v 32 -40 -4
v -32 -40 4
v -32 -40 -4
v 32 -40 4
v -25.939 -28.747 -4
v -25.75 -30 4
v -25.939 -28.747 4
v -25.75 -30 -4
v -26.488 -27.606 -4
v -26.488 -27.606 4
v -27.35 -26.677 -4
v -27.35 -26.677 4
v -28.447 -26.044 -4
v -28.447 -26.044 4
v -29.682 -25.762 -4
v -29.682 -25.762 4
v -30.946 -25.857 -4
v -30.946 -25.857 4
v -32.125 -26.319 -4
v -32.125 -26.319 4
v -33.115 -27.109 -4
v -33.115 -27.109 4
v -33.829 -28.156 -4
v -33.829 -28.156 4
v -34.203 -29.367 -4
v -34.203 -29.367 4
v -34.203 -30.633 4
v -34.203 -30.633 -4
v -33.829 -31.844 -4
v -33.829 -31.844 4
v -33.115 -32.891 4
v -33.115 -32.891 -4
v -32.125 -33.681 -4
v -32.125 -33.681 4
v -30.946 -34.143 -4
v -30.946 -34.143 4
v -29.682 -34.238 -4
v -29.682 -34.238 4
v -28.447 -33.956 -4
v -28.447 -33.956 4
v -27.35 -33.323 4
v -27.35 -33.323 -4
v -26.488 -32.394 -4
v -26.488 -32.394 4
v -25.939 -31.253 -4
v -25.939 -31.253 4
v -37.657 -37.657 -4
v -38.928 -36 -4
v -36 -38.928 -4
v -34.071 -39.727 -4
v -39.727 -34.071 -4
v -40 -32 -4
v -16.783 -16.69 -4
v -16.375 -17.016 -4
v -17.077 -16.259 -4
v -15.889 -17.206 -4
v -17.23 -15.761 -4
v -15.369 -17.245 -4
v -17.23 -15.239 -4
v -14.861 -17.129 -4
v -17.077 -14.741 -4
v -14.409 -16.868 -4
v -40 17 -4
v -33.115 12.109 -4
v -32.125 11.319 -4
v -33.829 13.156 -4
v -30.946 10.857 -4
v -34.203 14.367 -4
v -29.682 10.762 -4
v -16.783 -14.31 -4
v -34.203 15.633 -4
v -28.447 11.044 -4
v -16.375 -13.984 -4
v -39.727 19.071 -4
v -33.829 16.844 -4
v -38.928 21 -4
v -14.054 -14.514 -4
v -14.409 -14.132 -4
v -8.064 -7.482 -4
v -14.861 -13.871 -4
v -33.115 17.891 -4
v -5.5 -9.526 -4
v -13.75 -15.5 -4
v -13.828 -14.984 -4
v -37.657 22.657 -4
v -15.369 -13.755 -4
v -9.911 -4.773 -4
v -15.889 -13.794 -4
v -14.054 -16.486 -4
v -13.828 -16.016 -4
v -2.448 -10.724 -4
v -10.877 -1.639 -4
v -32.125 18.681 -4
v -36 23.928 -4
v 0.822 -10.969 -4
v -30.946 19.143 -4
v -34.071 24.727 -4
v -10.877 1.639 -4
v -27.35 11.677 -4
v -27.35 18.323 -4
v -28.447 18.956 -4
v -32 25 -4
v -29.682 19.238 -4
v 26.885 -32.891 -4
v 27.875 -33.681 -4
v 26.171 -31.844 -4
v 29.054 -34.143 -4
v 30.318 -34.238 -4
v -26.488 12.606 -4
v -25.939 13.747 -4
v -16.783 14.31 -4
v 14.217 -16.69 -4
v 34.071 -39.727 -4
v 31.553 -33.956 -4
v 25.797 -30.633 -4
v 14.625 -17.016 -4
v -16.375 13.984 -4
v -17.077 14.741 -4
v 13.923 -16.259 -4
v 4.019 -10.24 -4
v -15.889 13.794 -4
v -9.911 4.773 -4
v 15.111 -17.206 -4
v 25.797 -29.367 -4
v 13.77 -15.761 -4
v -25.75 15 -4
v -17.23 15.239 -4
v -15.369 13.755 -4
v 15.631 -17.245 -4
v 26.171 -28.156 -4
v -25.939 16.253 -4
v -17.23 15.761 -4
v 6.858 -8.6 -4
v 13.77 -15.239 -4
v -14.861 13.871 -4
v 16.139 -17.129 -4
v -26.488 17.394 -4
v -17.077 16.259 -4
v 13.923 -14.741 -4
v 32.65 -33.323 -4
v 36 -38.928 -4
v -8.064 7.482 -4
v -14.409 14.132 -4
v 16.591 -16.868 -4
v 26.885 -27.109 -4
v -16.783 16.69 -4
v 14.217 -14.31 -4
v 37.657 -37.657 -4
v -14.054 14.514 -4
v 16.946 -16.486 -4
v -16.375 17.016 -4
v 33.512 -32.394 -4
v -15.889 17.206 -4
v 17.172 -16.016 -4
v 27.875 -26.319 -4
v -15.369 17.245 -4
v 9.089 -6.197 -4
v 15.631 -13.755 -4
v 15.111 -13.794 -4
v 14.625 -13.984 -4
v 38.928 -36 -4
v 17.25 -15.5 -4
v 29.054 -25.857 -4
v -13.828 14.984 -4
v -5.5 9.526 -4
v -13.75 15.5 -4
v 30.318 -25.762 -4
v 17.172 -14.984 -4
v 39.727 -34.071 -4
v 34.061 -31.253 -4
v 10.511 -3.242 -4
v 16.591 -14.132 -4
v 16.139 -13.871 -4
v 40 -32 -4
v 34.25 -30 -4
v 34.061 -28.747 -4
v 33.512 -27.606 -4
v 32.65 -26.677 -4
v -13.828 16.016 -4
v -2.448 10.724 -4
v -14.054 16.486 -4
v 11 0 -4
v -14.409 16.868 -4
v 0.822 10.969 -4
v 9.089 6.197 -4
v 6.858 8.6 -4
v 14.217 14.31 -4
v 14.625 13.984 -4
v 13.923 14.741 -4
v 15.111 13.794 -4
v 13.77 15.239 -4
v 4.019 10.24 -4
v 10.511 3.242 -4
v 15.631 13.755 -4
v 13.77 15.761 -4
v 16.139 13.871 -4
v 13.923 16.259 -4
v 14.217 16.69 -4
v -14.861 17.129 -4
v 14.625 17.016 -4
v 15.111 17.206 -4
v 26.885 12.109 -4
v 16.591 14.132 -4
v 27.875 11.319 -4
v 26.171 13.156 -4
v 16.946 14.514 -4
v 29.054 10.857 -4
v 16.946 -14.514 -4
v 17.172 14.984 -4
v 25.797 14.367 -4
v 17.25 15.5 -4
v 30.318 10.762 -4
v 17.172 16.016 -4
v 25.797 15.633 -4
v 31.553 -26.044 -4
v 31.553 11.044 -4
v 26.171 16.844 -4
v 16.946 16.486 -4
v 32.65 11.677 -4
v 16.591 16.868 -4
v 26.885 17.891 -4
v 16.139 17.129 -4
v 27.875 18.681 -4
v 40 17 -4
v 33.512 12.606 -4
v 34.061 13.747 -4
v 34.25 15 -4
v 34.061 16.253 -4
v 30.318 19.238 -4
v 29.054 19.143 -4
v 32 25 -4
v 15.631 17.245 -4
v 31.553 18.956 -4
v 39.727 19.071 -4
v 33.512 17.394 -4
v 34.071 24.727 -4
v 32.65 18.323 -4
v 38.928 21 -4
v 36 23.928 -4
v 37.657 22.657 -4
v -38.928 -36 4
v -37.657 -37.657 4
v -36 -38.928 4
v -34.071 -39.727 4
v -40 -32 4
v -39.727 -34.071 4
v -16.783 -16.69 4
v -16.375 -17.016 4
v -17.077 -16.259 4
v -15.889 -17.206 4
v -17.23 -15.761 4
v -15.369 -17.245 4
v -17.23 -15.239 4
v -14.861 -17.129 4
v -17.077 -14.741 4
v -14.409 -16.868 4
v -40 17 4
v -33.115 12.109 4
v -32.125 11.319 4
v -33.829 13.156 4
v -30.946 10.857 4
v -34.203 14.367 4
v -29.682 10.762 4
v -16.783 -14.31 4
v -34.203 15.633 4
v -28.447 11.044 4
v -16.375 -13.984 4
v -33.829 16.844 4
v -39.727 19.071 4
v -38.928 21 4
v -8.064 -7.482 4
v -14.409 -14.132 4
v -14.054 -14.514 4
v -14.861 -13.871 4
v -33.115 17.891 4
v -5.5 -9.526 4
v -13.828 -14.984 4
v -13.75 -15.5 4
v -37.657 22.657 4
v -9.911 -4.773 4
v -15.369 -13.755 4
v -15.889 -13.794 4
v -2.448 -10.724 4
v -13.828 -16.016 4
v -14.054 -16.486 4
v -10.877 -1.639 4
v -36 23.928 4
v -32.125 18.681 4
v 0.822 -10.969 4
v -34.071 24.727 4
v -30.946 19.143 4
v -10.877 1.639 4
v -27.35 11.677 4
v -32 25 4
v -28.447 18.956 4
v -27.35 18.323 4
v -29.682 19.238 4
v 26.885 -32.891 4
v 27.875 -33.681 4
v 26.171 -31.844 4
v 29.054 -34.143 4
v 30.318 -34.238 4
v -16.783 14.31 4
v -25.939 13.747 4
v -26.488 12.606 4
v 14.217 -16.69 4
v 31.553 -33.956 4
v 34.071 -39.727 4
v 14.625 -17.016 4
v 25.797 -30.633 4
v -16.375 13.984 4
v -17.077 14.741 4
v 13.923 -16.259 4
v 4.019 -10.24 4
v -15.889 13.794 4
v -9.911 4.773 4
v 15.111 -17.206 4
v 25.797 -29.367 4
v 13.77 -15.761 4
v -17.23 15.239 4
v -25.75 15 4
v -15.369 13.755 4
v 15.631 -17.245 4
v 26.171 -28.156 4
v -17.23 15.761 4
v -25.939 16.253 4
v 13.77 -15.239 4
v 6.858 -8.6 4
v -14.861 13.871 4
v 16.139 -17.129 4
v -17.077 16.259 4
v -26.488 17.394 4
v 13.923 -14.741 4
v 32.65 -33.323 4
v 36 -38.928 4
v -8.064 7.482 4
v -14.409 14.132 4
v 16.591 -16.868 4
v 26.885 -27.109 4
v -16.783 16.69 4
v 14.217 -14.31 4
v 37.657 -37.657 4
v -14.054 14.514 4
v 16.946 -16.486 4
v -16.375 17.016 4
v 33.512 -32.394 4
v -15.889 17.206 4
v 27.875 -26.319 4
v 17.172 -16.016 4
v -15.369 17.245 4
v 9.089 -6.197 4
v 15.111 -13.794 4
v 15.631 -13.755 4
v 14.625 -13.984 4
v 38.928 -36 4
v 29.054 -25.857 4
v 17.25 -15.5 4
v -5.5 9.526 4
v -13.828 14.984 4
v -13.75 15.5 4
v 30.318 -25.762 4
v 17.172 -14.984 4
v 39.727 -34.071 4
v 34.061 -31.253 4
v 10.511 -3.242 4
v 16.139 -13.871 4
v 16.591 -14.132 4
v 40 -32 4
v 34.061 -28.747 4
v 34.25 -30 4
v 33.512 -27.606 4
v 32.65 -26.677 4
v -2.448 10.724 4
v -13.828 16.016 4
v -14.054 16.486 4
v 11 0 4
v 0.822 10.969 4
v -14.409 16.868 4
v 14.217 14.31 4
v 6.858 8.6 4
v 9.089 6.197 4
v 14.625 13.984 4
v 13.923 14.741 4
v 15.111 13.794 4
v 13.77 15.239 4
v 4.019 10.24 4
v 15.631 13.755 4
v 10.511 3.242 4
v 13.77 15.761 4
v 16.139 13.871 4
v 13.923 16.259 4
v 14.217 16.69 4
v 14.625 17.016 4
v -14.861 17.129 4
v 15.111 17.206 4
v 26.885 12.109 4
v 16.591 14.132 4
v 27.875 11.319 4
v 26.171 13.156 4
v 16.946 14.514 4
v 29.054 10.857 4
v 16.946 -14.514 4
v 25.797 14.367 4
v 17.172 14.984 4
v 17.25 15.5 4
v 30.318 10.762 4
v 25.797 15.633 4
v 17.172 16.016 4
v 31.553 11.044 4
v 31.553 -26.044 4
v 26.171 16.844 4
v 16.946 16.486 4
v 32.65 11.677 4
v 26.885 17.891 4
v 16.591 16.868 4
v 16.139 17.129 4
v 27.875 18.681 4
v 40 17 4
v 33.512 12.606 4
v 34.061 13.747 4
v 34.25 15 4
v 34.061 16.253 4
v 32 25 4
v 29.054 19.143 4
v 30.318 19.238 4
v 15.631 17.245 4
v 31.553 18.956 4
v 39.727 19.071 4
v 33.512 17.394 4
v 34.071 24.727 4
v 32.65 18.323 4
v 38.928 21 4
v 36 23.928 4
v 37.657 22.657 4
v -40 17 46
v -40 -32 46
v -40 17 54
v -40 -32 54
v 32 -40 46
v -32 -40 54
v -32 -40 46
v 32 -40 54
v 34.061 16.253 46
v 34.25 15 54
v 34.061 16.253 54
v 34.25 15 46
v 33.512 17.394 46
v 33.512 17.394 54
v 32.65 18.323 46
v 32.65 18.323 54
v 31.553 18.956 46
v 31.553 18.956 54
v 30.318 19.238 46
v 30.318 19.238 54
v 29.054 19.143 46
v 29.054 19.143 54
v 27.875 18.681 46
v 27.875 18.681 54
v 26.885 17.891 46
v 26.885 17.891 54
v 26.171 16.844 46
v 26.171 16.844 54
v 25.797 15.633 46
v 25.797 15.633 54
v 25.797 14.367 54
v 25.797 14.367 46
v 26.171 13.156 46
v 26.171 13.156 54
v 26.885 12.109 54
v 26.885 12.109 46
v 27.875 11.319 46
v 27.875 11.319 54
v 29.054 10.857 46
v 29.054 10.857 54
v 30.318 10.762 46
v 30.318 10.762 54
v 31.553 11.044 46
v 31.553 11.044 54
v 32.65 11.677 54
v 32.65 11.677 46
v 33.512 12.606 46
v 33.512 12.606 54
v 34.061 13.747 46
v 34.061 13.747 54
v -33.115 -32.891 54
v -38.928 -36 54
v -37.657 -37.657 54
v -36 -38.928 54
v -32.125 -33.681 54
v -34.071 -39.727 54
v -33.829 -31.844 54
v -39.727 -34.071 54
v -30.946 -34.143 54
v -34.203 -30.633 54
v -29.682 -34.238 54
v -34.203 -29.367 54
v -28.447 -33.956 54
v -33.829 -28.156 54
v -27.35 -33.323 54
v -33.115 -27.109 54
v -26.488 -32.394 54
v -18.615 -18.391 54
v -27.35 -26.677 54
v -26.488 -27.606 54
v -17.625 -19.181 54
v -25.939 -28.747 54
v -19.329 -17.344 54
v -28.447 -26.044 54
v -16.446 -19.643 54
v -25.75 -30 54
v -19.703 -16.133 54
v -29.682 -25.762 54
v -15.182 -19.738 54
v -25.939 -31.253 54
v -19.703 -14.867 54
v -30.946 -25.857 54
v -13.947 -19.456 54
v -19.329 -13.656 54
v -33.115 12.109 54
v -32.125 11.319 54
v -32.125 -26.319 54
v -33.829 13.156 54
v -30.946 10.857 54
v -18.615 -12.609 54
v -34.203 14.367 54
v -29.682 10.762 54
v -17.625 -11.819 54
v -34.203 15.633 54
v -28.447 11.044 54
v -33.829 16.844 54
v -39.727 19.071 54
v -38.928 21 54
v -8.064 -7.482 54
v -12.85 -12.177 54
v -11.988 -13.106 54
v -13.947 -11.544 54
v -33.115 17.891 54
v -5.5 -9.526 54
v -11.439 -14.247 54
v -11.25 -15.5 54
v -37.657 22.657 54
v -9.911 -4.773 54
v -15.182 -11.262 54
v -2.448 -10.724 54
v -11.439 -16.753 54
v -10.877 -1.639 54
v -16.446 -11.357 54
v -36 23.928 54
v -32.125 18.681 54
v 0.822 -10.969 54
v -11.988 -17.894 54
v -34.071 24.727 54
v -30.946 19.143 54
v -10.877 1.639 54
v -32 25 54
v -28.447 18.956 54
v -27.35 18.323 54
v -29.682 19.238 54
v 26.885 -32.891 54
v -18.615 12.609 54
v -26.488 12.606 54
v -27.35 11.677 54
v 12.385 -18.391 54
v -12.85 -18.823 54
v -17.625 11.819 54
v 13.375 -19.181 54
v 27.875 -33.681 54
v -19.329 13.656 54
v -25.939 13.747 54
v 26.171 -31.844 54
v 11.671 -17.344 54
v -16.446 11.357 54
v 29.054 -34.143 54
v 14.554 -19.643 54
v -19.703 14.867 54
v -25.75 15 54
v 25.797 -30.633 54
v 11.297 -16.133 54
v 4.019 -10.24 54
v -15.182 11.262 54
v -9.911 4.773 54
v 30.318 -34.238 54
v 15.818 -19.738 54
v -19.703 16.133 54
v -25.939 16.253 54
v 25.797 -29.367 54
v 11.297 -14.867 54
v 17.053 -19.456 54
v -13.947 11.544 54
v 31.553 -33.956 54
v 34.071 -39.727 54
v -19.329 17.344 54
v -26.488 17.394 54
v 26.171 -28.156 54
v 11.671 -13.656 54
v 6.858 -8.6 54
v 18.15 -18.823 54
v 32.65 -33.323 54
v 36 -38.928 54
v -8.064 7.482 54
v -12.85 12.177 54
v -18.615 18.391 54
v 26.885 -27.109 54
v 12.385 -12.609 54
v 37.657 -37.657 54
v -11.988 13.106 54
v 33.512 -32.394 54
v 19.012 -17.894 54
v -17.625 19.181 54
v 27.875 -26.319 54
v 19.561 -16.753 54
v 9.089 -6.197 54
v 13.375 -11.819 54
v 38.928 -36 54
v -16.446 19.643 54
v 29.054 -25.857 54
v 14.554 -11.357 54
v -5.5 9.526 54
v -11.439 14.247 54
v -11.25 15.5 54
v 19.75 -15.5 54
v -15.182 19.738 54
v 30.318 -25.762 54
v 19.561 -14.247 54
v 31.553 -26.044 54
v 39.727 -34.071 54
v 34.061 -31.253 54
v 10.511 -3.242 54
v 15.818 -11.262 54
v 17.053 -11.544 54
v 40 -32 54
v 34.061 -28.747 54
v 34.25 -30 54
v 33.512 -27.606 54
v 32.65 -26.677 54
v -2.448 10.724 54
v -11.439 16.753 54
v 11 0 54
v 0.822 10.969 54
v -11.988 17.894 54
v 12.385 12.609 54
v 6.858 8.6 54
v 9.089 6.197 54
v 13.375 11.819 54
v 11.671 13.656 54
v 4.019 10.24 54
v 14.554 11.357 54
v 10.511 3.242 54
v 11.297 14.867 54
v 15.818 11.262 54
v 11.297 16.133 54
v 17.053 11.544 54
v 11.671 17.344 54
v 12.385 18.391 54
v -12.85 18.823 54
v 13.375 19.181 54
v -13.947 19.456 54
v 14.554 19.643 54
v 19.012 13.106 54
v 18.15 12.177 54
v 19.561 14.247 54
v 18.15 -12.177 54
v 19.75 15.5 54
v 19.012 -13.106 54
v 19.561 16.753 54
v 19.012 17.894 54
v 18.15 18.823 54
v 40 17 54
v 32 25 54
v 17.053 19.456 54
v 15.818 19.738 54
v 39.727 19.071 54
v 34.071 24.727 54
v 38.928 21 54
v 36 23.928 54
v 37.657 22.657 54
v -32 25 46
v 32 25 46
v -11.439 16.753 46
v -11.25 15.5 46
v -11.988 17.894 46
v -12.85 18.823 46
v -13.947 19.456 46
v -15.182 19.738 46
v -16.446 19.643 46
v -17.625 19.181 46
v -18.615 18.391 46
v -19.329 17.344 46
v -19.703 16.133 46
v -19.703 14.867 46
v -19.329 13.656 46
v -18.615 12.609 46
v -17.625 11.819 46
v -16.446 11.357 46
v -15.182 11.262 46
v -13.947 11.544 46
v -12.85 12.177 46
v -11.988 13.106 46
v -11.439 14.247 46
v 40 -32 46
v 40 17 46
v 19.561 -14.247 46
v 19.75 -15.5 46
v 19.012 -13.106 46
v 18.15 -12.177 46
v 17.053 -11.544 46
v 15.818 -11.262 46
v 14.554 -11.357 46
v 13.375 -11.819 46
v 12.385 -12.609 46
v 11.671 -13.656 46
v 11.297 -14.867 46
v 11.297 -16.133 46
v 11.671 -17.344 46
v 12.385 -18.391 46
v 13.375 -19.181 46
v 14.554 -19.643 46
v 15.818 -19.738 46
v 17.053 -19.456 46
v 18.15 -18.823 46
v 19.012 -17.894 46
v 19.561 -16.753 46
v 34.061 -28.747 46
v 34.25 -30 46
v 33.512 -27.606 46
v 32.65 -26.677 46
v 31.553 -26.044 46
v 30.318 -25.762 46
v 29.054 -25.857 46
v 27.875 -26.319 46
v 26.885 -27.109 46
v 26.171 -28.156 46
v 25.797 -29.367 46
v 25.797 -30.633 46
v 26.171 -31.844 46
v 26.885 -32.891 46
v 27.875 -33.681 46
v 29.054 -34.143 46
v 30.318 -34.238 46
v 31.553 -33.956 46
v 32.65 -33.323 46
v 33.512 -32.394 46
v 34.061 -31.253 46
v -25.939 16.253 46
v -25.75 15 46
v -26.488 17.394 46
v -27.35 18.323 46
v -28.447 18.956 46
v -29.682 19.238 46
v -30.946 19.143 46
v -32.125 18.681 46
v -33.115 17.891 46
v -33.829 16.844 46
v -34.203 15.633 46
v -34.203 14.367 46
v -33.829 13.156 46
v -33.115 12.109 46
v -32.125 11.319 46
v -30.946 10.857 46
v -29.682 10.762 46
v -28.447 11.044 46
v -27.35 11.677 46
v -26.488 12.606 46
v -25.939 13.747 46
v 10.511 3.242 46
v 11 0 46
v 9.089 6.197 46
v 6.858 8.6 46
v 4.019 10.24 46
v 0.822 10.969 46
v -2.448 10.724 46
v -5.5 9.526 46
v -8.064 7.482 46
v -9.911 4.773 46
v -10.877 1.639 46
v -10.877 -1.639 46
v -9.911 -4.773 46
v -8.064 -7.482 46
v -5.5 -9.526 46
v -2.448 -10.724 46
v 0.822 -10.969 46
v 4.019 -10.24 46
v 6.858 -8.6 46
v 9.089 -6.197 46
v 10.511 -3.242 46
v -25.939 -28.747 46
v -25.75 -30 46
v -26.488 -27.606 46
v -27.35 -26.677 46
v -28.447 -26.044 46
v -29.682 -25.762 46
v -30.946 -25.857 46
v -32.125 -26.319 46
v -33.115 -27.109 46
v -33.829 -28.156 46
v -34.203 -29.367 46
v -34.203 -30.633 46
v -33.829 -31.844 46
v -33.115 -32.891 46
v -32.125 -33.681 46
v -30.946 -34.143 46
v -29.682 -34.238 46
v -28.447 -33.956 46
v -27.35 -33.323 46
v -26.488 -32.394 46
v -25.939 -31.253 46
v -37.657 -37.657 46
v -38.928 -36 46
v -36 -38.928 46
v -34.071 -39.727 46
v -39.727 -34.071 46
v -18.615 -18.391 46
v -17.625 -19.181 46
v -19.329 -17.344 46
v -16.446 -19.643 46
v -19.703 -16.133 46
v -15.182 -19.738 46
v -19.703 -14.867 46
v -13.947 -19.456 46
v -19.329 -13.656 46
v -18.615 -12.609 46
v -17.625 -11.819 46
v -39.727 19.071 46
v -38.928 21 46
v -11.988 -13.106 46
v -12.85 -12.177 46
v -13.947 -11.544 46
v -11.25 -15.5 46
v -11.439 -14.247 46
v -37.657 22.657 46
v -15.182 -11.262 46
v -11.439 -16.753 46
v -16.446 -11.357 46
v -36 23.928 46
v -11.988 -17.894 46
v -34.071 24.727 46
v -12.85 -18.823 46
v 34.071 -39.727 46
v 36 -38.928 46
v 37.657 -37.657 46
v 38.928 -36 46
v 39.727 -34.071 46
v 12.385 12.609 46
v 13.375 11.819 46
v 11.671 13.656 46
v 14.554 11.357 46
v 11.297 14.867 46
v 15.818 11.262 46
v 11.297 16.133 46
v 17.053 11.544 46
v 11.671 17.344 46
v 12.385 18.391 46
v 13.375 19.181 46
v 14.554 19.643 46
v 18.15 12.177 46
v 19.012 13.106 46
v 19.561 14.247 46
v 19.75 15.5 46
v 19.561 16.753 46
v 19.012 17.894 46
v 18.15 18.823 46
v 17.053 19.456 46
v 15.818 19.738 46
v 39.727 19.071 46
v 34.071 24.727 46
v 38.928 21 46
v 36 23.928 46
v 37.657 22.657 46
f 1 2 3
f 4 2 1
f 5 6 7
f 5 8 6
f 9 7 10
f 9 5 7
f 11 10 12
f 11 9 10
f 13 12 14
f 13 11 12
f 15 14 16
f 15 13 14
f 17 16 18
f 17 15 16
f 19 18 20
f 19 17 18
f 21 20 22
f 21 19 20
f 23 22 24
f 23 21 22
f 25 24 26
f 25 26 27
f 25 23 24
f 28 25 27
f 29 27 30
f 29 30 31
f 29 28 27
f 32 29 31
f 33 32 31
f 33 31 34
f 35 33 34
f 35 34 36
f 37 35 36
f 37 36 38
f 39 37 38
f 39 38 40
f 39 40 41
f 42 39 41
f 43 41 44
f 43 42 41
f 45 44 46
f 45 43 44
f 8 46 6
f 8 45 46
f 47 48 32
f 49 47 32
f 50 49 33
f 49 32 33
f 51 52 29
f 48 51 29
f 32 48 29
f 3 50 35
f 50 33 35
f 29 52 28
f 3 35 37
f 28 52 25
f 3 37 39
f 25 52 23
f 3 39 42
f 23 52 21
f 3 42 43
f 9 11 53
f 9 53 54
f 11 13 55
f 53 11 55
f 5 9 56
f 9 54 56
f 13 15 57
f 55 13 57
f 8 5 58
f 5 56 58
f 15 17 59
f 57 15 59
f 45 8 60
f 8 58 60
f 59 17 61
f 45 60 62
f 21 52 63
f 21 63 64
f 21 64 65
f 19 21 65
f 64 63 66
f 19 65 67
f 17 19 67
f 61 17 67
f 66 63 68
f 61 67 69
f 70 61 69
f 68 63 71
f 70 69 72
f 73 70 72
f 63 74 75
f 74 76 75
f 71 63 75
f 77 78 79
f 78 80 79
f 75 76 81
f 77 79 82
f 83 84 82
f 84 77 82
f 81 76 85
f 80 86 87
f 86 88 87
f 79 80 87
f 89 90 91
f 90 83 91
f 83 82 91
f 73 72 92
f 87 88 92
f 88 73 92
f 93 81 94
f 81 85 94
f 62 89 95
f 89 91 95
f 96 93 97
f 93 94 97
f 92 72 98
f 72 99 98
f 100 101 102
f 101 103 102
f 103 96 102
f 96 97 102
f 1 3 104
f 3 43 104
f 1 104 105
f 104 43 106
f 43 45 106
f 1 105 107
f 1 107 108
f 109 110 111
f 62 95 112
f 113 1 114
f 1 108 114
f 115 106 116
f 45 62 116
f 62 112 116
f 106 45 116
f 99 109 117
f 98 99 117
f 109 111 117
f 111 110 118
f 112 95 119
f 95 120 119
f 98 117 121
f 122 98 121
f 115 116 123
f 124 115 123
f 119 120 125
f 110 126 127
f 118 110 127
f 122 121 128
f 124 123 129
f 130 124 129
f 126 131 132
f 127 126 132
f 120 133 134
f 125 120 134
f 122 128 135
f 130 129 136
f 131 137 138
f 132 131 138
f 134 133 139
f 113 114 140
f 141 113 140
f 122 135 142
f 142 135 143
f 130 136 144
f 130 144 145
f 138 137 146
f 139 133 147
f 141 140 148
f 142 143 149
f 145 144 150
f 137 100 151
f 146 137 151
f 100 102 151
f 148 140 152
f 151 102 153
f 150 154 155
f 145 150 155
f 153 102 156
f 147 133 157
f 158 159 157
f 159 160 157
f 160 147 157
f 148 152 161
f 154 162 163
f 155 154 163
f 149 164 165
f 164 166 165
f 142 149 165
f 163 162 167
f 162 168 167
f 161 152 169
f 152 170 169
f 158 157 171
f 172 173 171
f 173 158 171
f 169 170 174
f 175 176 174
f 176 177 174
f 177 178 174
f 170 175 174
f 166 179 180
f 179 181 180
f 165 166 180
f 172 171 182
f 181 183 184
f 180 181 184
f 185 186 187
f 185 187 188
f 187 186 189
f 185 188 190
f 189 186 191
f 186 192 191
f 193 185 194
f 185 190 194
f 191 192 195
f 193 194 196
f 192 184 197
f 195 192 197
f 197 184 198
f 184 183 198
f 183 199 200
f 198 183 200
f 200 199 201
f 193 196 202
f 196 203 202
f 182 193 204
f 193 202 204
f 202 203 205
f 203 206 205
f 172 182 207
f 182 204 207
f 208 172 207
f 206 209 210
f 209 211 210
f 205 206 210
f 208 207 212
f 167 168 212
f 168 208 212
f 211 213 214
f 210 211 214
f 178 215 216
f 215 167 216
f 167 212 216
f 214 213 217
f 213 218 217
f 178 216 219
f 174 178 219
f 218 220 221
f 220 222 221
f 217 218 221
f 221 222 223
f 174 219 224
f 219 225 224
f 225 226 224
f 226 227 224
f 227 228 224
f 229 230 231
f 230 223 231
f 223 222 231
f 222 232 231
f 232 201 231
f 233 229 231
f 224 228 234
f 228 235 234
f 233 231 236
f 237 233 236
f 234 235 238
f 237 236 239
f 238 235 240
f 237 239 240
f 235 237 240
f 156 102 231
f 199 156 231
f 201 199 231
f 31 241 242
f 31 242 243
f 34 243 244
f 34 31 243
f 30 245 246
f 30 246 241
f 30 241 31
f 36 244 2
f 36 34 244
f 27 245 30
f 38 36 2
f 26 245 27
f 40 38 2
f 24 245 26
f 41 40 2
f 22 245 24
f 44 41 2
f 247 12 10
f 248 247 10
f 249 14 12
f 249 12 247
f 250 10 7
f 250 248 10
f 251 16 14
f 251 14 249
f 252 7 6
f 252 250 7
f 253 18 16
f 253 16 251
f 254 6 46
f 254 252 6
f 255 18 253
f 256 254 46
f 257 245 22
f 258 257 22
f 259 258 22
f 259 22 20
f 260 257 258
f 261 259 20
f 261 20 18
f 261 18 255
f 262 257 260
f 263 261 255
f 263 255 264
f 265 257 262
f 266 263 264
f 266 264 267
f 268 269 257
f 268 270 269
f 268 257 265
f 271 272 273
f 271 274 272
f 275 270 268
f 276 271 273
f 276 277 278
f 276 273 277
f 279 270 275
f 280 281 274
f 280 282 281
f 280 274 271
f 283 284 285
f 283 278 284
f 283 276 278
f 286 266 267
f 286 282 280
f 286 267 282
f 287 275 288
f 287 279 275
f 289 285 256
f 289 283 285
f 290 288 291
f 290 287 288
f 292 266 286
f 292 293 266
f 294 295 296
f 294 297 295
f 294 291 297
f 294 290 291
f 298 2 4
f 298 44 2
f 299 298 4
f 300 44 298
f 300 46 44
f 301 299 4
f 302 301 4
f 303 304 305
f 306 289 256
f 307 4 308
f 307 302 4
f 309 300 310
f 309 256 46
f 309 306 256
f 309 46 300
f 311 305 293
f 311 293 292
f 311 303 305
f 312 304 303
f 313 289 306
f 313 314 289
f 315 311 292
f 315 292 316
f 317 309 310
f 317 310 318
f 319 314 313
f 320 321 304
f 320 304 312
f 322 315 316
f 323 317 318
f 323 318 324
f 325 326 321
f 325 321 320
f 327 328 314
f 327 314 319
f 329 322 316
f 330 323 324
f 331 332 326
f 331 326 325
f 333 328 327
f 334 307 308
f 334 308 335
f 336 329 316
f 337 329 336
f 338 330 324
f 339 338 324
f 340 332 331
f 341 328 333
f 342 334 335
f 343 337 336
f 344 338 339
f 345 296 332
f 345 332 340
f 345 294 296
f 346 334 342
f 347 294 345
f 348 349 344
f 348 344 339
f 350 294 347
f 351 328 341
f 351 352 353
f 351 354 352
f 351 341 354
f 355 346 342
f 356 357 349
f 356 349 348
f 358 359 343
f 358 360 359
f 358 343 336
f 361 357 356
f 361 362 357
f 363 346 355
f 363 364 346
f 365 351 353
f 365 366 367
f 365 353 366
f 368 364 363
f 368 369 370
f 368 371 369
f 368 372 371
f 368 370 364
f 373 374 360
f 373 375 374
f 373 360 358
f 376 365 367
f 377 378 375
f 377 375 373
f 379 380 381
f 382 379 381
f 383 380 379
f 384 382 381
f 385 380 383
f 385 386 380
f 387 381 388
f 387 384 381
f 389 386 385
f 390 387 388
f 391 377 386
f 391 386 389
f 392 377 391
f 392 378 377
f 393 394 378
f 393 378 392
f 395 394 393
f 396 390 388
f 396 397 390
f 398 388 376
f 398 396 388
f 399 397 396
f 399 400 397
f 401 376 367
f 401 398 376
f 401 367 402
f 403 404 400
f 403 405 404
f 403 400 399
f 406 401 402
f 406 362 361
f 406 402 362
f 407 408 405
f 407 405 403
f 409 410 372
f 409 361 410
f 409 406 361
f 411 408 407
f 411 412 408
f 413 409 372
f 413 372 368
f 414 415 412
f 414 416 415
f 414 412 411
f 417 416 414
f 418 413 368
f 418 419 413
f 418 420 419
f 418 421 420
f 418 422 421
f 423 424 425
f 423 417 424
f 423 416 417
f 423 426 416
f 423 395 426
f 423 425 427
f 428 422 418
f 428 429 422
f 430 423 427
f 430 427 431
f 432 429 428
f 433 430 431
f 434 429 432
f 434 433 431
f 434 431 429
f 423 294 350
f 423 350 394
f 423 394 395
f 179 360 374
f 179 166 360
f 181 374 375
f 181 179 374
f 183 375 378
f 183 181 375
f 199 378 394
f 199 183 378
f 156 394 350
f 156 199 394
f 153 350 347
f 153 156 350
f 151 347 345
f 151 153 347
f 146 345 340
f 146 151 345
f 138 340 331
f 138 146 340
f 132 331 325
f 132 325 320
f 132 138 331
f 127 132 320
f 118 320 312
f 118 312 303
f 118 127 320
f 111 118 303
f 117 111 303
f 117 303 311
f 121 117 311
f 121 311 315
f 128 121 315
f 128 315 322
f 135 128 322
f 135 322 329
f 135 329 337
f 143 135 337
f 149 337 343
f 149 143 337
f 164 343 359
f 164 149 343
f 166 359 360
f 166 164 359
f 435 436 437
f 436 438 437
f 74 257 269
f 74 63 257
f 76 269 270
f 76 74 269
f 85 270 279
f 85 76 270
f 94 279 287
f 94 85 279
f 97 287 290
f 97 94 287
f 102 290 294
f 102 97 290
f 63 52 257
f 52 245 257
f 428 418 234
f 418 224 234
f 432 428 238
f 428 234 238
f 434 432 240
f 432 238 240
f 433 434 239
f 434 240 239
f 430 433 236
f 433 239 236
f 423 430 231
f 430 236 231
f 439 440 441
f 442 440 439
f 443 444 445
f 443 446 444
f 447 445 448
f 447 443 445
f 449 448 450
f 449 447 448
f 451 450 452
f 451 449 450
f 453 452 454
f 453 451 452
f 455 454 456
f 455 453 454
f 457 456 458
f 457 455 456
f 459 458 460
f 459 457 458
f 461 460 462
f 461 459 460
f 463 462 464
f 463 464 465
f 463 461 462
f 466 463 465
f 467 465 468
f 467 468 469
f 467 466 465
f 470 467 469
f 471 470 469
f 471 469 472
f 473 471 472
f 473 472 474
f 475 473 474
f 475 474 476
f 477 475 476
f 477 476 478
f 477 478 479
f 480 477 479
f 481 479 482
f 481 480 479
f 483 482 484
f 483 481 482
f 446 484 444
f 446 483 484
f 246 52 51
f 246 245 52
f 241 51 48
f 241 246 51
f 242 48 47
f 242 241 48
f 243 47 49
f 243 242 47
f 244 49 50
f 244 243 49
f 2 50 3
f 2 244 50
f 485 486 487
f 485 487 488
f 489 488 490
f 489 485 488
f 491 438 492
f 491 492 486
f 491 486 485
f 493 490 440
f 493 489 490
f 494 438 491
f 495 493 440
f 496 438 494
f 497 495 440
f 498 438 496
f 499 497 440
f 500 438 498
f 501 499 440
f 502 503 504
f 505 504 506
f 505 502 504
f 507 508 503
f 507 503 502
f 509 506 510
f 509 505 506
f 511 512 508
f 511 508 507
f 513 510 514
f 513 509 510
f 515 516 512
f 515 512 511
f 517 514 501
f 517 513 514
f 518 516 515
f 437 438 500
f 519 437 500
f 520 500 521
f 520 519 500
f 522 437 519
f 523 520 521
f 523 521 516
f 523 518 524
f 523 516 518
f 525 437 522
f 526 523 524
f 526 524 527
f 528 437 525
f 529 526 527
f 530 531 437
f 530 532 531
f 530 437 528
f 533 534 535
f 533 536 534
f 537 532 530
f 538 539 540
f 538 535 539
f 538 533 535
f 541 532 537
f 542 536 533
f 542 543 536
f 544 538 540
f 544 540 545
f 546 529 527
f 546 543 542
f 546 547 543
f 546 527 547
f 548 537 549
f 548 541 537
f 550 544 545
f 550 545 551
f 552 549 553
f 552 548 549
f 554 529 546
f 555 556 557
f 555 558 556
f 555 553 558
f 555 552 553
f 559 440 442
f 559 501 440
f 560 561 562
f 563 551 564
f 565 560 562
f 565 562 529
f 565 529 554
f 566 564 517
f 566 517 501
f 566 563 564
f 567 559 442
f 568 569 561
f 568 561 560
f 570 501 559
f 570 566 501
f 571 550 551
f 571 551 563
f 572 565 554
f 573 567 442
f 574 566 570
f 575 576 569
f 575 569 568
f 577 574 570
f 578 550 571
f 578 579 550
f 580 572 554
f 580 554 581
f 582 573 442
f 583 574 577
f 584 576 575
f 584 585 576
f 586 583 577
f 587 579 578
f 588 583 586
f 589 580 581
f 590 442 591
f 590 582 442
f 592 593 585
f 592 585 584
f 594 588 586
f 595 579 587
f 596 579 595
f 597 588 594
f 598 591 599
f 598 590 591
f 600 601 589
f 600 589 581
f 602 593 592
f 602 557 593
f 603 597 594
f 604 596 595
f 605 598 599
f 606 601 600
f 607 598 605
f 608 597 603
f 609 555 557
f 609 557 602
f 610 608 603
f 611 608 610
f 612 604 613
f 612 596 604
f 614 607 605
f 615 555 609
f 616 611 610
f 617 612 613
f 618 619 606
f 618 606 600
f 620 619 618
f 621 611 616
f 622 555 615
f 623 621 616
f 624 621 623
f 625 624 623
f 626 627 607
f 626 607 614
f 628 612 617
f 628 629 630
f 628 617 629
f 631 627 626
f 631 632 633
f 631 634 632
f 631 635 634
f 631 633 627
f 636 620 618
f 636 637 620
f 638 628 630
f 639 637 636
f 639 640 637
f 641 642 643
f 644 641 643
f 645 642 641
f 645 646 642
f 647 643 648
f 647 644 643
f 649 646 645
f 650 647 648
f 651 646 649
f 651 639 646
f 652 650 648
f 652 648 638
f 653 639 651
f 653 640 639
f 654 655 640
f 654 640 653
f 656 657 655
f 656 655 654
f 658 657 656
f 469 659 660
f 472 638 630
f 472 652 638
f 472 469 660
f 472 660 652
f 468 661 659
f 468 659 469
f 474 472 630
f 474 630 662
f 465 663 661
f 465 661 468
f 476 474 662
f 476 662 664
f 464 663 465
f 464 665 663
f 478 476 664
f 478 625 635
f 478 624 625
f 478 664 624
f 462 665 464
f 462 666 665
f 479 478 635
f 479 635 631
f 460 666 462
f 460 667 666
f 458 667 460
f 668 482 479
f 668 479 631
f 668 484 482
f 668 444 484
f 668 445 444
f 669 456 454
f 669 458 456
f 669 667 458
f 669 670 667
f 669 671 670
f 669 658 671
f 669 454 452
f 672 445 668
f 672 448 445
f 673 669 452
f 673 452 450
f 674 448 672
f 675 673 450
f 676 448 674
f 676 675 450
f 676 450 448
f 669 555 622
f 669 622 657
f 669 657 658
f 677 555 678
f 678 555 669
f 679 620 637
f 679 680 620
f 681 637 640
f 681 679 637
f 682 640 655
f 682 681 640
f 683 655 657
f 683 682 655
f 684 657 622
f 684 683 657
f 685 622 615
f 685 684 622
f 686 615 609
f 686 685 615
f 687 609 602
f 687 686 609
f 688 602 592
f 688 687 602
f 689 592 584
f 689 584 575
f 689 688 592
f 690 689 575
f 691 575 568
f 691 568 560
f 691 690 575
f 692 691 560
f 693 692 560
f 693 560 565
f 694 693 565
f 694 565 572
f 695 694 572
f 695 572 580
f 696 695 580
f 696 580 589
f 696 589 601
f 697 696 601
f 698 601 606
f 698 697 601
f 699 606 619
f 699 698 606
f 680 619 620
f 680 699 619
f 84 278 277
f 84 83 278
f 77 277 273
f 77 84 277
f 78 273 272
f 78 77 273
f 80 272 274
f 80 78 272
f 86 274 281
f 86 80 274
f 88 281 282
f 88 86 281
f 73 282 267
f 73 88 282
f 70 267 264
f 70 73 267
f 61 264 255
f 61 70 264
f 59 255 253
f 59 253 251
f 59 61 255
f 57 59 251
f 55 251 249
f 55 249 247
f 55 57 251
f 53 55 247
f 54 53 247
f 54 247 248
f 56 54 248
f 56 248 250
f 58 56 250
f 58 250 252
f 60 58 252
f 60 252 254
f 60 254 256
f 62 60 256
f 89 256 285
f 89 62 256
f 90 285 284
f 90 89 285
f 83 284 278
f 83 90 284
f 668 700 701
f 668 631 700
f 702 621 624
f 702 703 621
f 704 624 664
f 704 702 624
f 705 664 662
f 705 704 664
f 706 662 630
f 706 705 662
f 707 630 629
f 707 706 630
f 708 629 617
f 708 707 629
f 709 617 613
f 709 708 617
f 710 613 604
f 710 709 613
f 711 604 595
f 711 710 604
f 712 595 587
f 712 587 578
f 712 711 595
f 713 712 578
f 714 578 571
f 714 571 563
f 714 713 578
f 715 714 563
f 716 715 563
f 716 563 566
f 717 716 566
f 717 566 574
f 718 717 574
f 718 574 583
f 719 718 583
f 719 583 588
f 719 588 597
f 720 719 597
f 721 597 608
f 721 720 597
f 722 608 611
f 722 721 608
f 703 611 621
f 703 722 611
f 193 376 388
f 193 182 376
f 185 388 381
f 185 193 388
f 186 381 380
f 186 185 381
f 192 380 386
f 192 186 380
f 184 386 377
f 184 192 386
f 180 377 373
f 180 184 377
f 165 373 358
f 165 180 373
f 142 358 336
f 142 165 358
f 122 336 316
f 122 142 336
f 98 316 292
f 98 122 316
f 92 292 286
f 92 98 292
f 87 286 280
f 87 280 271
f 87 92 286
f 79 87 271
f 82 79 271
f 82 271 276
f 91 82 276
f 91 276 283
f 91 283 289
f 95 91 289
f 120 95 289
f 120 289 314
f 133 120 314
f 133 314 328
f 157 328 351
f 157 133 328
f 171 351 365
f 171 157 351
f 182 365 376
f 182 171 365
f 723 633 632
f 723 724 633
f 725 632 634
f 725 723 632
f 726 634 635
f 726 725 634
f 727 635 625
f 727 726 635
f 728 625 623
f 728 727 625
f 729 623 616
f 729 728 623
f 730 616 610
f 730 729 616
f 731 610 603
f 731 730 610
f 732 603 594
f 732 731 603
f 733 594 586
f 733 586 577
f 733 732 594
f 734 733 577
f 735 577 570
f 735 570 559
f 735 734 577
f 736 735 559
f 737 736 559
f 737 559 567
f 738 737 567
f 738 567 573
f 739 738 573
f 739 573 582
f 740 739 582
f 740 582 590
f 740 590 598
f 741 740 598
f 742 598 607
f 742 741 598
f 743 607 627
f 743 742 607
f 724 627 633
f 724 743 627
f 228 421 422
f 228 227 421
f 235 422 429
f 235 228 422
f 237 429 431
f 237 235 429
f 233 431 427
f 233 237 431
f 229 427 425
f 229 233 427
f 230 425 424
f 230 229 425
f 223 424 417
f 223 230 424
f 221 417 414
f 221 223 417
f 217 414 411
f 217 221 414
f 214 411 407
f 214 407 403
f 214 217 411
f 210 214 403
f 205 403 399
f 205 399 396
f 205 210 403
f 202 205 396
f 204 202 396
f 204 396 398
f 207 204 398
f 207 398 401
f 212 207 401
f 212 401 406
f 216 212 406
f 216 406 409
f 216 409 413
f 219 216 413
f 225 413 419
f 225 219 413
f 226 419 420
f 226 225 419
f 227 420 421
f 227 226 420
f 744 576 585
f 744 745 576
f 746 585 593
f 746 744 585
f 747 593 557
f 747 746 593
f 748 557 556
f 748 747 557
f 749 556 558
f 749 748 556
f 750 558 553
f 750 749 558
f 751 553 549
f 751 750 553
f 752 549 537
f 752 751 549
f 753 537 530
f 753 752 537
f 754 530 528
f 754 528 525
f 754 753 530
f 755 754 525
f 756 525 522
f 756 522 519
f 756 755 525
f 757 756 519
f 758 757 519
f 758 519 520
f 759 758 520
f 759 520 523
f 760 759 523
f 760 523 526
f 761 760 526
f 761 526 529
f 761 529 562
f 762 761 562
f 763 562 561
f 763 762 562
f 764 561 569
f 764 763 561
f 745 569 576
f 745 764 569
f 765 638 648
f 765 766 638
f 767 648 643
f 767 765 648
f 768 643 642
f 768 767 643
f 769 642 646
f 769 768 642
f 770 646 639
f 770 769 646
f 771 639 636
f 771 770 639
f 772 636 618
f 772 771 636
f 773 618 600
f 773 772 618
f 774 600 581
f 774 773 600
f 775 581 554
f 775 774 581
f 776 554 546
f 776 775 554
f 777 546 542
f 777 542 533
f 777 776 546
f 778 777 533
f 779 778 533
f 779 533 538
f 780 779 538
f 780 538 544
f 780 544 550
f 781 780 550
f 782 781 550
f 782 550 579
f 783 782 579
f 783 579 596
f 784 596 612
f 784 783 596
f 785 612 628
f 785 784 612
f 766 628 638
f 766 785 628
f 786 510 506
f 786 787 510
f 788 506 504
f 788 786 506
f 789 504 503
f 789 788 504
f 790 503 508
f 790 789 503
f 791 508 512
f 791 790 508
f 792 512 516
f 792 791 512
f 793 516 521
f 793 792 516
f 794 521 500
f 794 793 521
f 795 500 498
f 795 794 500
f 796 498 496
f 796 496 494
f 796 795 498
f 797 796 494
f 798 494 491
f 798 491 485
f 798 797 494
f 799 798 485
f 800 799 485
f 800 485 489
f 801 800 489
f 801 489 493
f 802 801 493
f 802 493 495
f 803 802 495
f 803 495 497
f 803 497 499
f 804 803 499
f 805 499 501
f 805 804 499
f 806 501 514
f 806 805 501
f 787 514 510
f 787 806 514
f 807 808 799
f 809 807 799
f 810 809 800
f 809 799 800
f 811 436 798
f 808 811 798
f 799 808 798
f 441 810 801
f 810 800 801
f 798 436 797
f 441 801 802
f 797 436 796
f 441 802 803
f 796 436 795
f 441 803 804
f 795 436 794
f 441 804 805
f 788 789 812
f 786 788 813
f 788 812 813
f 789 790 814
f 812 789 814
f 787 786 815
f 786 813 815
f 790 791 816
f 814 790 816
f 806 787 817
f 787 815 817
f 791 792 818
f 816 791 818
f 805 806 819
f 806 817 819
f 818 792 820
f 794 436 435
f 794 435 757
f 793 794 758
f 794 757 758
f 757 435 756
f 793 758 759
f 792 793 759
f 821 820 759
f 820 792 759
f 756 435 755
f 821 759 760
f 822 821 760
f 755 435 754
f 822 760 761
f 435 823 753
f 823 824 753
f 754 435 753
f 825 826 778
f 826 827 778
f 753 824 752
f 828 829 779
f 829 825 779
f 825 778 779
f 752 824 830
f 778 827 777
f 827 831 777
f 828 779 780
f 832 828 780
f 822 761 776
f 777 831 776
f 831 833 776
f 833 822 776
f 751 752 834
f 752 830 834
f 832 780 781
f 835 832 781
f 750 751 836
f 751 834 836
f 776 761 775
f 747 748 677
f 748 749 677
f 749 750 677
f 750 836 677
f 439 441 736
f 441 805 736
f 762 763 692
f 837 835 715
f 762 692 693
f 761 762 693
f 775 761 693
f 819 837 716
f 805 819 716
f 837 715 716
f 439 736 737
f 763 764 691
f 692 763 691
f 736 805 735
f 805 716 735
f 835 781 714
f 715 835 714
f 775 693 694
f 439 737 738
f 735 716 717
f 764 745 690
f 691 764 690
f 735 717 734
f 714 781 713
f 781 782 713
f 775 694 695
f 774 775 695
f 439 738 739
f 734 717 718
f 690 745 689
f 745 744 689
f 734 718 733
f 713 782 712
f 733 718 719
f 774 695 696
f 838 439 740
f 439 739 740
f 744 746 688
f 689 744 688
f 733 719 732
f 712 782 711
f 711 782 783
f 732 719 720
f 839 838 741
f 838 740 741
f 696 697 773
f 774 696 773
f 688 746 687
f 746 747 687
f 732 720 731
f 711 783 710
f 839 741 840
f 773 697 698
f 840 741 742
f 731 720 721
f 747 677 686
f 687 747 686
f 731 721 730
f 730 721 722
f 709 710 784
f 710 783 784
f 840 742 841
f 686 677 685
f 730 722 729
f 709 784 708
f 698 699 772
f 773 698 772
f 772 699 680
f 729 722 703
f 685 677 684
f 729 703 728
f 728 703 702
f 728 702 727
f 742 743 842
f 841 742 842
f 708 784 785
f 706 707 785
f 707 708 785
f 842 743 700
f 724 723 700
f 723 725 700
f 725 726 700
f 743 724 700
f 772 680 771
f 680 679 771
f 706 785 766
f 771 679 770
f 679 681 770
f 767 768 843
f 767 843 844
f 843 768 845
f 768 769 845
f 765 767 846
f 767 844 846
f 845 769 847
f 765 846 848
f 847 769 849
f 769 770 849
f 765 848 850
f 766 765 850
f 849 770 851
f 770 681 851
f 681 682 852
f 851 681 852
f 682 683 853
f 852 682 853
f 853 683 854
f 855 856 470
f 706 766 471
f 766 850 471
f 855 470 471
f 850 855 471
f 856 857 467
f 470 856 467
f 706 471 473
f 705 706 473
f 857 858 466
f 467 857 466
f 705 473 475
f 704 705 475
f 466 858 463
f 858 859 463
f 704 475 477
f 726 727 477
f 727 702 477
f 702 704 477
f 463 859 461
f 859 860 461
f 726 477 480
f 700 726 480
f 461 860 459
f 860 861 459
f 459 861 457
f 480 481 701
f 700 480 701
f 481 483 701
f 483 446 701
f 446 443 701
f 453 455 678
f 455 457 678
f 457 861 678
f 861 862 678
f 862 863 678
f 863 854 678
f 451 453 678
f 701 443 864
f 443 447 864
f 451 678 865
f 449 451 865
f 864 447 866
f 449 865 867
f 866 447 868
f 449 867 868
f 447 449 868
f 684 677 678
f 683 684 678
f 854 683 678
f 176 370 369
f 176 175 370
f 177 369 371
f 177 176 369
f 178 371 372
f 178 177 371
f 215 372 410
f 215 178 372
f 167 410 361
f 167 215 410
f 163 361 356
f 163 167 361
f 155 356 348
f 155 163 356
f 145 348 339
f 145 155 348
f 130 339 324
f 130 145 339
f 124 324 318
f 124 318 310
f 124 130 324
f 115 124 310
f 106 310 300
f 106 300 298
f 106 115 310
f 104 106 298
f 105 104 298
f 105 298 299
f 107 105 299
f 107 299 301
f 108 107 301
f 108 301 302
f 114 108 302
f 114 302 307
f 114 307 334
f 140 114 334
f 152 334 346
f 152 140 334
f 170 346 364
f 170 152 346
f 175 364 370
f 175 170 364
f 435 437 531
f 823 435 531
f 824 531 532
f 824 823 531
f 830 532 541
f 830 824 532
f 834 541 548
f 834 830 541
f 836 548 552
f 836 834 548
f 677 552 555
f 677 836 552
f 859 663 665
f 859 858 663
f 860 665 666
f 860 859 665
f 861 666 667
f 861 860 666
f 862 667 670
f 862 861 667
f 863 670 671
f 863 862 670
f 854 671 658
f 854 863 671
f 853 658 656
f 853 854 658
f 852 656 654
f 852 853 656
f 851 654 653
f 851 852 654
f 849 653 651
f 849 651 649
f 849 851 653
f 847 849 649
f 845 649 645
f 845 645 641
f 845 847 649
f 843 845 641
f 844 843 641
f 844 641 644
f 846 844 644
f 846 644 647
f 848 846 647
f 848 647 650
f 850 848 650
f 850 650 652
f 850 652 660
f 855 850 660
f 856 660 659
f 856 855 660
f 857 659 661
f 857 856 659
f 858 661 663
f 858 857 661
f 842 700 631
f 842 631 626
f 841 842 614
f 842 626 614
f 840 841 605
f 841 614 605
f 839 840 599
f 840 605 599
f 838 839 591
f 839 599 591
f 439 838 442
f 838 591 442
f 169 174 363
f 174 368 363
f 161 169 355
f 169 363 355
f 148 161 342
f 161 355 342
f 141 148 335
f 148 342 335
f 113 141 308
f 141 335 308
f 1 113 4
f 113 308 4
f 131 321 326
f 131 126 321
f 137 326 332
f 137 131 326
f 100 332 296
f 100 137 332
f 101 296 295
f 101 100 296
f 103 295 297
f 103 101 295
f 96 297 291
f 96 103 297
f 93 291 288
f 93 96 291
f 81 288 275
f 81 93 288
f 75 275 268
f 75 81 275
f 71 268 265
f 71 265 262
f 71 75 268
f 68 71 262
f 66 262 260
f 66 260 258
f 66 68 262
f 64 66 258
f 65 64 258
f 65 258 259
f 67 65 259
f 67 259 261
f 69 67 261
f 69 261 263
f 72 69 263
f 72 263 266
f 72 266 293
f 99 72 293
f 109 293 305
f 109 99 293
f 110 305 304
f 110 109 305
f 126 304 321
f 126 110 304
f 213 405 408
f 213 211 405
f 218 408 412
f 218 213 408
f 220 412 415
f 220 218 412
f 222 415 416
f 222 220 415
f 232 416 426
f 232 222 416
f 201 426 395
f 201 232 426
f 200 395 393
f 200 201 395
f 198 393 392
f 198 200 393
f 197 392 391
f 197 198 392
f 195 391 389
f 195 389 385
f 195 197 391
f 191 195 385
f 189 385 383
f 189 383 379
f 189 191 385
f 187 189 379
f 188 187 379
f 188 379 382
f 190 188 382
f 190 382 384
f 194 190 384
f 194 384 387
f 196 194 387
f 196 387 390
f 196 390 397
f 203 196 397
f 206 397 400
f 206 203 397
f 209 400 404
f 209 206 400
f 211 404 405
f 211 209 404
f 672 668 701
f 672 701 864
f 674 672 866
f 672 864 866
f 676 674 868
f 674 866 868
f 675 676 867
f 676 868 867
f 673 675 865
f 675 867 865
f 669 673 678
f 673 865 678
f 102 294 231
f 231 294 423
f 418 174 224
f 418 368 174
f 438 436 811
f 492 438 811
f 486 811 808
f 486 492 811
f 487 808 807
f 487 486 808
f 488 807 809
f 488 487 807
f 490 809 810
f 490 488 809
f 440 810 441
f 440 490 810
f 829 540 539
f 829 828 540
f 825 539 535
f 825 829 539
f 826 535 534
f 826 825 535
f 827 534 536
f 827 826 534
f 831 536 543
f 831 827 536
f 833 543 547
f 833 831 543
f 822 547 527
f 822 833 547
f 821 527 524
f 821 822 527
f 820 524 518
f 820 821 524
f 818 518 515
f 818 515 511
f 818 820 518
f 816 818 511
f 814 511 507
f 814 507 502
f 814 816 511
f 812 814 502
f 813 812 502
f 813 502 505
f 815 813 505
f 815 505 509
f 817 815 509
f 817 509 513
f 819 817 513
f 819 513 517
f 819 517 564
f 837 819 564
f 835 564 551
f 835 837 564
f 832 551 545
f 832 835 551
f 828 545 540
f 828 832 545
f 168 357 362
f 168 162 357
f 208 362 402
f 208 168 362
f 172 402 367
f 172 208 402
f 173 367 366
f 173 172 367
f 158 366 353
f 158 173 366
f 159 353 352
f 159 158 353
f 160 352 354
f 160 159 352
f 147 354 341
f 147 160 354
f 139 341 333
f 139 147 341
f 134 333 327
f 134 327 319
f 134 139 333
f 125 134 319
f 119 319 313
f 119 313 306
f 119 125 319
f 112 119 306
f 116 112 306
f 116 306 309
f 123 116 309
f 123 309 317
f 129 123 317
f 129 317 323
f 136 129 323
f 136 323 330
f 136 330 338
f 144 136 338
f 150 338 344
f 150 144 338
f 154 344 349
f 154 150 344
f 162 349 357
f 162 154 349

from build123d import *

# Parameters (mm, degrees)
SKIZZE1_W                       = 80
SKIZZE1_H                       = 65
SKIZZE1_R                       = 11
SKIZZE1_R_2                     = 1.75
SKIZZE1_R_3                     = 4.25
AUFSATZ_LINEAR_AUSTRAGEN1_DEPTH = 4
SKIZZE2_W                       = 80
SKIZZE2_H                       = 65
SKIZZE2_R                       = 11
SKIZZE2_R_2                     = 4.25
AUFSATZ_LINEAR_AUSTRAGEN2_DEPTH = 4
VERRUNDUNG1_R                   = 8
VERRUNDUNG2_R                   = 8


with BuildPart() as part:
    # Skizze1 → Aufsatz-Linear austragen1 (new, symmetric)
    with BuildSketch(Plane.XY):
        with Locations((0, -7.5)):
            Rectangle(SKIZZE1_W, SKIZZE1_H)
        Circle(SKIZZE1_R, mode=Mode.SUBTRACT)
        with Locations((-15.5, 15.5)):
            Circle(SKIZZE1_R_2, mode=Mode.SUBTRACT)
        with Locations((-15.5, -15.5)):
            Circle(SKIZZE1_R_2, mode=Mode.SUBTRACT)
        with Locations((15.5, 15.5)):
            Circle(SKIZZE1_R_2, mode=Mode.SUBTRACT)
        with Locations((15.5, -15.5)):
            Circle(SKIZZE1_R_2, mode=Mode.SUBTRACT)
        with Locations((-30, 15)):
            Circle(SKIZZE1_R_3, mode=Mode.SUBTRACT)
        with Locations((30, 15)):
            Circle(SKIZZE1_R_3, mode=Mode.SUBTRACT)
        with Locations((-30, -30)):
            Circle(SKIZZE1_R_3, mode=Mode.SUBTRACT)
        with Locations((30, -30)):
            Circle(SKIZZE1_R_3, mode=Mode.SUBTRACT)
    extrude(amount=AUFSATZ_LINEAR_AUSTRAGEN1_DEPTH, both=True)

    # Verrundung1
    verrundung1_edges = [part.edges().sort_by_distance(p)[0] for p in [
        (-40, 25, 0),
        (40, 25, 0),
        (40, -40, 0),
        (-40, -40, 0),
    ]]
    fillet(verrundung1_edges, radius=VERRUNDUNG1_R)


with BuildPart() as body_2:
    # Skizze2 → Aufsatz-Linear austragen2 (new, symmetric)
    with BuildSketch(Plane.XY.offset(50)):
        with Locations((0, -7.5)):
            Rectangle(SKIZZE2_W, SKIZZE2_H)
        Circle(SKIZZE2_R, mode=Mode.SUBTRACT)
        with Locations((-30, 15)):
            Circle(SKIZZE2_R_2, mode=Mode.SUBTRACT)
        with Locations((-30, -30)):
            Circle(SKIZZE2_R_2, mode=Mode.SUBTRACT)
        with Locations((30, -30)):
            Circle(SKIZZE2_R_2, mode=Mode.SUBTRACT)
        with Locations((30, 15)):
            Circle(SKIZZE2_R_2, mode=Mode.SUBTRACT)
        with Locations((-15.5, 15.5)):
            Circle(SKIZZE2_R_2, mode=Mode.SUBTRACT)
        with Locations((-15.5, -15.5)):
            Circle(SKIZZE2_R_2, mode=Mode.SUBTRACT)
        with Locations((15.5, -15.5)):
            Circle(SKIZZE2_R_2, mode=Mode.SUBTRACT)
        with Locations((15.5, 15.5)):
            Circle(SKIZZE2_R_2, mode=Mode.SUBTRACT)
    extrude(amount=AUFSATZ_LINEAR_AUSTRAGEN2_DEPTH, both=True)

    # Verrundung2
    verrundung2_edges = [body_2.edges().sort_by_distance(p)[0] for p in [
        (-40, 25, 50),
        (40, 25, 50),
        (40, -40, 50),
        (-40, -40, 50),
    ]]
    fillet(verrundung2_edges, radius=VERRUNDUNG2_R)


solid = Compound([part.part, body_2.part])
